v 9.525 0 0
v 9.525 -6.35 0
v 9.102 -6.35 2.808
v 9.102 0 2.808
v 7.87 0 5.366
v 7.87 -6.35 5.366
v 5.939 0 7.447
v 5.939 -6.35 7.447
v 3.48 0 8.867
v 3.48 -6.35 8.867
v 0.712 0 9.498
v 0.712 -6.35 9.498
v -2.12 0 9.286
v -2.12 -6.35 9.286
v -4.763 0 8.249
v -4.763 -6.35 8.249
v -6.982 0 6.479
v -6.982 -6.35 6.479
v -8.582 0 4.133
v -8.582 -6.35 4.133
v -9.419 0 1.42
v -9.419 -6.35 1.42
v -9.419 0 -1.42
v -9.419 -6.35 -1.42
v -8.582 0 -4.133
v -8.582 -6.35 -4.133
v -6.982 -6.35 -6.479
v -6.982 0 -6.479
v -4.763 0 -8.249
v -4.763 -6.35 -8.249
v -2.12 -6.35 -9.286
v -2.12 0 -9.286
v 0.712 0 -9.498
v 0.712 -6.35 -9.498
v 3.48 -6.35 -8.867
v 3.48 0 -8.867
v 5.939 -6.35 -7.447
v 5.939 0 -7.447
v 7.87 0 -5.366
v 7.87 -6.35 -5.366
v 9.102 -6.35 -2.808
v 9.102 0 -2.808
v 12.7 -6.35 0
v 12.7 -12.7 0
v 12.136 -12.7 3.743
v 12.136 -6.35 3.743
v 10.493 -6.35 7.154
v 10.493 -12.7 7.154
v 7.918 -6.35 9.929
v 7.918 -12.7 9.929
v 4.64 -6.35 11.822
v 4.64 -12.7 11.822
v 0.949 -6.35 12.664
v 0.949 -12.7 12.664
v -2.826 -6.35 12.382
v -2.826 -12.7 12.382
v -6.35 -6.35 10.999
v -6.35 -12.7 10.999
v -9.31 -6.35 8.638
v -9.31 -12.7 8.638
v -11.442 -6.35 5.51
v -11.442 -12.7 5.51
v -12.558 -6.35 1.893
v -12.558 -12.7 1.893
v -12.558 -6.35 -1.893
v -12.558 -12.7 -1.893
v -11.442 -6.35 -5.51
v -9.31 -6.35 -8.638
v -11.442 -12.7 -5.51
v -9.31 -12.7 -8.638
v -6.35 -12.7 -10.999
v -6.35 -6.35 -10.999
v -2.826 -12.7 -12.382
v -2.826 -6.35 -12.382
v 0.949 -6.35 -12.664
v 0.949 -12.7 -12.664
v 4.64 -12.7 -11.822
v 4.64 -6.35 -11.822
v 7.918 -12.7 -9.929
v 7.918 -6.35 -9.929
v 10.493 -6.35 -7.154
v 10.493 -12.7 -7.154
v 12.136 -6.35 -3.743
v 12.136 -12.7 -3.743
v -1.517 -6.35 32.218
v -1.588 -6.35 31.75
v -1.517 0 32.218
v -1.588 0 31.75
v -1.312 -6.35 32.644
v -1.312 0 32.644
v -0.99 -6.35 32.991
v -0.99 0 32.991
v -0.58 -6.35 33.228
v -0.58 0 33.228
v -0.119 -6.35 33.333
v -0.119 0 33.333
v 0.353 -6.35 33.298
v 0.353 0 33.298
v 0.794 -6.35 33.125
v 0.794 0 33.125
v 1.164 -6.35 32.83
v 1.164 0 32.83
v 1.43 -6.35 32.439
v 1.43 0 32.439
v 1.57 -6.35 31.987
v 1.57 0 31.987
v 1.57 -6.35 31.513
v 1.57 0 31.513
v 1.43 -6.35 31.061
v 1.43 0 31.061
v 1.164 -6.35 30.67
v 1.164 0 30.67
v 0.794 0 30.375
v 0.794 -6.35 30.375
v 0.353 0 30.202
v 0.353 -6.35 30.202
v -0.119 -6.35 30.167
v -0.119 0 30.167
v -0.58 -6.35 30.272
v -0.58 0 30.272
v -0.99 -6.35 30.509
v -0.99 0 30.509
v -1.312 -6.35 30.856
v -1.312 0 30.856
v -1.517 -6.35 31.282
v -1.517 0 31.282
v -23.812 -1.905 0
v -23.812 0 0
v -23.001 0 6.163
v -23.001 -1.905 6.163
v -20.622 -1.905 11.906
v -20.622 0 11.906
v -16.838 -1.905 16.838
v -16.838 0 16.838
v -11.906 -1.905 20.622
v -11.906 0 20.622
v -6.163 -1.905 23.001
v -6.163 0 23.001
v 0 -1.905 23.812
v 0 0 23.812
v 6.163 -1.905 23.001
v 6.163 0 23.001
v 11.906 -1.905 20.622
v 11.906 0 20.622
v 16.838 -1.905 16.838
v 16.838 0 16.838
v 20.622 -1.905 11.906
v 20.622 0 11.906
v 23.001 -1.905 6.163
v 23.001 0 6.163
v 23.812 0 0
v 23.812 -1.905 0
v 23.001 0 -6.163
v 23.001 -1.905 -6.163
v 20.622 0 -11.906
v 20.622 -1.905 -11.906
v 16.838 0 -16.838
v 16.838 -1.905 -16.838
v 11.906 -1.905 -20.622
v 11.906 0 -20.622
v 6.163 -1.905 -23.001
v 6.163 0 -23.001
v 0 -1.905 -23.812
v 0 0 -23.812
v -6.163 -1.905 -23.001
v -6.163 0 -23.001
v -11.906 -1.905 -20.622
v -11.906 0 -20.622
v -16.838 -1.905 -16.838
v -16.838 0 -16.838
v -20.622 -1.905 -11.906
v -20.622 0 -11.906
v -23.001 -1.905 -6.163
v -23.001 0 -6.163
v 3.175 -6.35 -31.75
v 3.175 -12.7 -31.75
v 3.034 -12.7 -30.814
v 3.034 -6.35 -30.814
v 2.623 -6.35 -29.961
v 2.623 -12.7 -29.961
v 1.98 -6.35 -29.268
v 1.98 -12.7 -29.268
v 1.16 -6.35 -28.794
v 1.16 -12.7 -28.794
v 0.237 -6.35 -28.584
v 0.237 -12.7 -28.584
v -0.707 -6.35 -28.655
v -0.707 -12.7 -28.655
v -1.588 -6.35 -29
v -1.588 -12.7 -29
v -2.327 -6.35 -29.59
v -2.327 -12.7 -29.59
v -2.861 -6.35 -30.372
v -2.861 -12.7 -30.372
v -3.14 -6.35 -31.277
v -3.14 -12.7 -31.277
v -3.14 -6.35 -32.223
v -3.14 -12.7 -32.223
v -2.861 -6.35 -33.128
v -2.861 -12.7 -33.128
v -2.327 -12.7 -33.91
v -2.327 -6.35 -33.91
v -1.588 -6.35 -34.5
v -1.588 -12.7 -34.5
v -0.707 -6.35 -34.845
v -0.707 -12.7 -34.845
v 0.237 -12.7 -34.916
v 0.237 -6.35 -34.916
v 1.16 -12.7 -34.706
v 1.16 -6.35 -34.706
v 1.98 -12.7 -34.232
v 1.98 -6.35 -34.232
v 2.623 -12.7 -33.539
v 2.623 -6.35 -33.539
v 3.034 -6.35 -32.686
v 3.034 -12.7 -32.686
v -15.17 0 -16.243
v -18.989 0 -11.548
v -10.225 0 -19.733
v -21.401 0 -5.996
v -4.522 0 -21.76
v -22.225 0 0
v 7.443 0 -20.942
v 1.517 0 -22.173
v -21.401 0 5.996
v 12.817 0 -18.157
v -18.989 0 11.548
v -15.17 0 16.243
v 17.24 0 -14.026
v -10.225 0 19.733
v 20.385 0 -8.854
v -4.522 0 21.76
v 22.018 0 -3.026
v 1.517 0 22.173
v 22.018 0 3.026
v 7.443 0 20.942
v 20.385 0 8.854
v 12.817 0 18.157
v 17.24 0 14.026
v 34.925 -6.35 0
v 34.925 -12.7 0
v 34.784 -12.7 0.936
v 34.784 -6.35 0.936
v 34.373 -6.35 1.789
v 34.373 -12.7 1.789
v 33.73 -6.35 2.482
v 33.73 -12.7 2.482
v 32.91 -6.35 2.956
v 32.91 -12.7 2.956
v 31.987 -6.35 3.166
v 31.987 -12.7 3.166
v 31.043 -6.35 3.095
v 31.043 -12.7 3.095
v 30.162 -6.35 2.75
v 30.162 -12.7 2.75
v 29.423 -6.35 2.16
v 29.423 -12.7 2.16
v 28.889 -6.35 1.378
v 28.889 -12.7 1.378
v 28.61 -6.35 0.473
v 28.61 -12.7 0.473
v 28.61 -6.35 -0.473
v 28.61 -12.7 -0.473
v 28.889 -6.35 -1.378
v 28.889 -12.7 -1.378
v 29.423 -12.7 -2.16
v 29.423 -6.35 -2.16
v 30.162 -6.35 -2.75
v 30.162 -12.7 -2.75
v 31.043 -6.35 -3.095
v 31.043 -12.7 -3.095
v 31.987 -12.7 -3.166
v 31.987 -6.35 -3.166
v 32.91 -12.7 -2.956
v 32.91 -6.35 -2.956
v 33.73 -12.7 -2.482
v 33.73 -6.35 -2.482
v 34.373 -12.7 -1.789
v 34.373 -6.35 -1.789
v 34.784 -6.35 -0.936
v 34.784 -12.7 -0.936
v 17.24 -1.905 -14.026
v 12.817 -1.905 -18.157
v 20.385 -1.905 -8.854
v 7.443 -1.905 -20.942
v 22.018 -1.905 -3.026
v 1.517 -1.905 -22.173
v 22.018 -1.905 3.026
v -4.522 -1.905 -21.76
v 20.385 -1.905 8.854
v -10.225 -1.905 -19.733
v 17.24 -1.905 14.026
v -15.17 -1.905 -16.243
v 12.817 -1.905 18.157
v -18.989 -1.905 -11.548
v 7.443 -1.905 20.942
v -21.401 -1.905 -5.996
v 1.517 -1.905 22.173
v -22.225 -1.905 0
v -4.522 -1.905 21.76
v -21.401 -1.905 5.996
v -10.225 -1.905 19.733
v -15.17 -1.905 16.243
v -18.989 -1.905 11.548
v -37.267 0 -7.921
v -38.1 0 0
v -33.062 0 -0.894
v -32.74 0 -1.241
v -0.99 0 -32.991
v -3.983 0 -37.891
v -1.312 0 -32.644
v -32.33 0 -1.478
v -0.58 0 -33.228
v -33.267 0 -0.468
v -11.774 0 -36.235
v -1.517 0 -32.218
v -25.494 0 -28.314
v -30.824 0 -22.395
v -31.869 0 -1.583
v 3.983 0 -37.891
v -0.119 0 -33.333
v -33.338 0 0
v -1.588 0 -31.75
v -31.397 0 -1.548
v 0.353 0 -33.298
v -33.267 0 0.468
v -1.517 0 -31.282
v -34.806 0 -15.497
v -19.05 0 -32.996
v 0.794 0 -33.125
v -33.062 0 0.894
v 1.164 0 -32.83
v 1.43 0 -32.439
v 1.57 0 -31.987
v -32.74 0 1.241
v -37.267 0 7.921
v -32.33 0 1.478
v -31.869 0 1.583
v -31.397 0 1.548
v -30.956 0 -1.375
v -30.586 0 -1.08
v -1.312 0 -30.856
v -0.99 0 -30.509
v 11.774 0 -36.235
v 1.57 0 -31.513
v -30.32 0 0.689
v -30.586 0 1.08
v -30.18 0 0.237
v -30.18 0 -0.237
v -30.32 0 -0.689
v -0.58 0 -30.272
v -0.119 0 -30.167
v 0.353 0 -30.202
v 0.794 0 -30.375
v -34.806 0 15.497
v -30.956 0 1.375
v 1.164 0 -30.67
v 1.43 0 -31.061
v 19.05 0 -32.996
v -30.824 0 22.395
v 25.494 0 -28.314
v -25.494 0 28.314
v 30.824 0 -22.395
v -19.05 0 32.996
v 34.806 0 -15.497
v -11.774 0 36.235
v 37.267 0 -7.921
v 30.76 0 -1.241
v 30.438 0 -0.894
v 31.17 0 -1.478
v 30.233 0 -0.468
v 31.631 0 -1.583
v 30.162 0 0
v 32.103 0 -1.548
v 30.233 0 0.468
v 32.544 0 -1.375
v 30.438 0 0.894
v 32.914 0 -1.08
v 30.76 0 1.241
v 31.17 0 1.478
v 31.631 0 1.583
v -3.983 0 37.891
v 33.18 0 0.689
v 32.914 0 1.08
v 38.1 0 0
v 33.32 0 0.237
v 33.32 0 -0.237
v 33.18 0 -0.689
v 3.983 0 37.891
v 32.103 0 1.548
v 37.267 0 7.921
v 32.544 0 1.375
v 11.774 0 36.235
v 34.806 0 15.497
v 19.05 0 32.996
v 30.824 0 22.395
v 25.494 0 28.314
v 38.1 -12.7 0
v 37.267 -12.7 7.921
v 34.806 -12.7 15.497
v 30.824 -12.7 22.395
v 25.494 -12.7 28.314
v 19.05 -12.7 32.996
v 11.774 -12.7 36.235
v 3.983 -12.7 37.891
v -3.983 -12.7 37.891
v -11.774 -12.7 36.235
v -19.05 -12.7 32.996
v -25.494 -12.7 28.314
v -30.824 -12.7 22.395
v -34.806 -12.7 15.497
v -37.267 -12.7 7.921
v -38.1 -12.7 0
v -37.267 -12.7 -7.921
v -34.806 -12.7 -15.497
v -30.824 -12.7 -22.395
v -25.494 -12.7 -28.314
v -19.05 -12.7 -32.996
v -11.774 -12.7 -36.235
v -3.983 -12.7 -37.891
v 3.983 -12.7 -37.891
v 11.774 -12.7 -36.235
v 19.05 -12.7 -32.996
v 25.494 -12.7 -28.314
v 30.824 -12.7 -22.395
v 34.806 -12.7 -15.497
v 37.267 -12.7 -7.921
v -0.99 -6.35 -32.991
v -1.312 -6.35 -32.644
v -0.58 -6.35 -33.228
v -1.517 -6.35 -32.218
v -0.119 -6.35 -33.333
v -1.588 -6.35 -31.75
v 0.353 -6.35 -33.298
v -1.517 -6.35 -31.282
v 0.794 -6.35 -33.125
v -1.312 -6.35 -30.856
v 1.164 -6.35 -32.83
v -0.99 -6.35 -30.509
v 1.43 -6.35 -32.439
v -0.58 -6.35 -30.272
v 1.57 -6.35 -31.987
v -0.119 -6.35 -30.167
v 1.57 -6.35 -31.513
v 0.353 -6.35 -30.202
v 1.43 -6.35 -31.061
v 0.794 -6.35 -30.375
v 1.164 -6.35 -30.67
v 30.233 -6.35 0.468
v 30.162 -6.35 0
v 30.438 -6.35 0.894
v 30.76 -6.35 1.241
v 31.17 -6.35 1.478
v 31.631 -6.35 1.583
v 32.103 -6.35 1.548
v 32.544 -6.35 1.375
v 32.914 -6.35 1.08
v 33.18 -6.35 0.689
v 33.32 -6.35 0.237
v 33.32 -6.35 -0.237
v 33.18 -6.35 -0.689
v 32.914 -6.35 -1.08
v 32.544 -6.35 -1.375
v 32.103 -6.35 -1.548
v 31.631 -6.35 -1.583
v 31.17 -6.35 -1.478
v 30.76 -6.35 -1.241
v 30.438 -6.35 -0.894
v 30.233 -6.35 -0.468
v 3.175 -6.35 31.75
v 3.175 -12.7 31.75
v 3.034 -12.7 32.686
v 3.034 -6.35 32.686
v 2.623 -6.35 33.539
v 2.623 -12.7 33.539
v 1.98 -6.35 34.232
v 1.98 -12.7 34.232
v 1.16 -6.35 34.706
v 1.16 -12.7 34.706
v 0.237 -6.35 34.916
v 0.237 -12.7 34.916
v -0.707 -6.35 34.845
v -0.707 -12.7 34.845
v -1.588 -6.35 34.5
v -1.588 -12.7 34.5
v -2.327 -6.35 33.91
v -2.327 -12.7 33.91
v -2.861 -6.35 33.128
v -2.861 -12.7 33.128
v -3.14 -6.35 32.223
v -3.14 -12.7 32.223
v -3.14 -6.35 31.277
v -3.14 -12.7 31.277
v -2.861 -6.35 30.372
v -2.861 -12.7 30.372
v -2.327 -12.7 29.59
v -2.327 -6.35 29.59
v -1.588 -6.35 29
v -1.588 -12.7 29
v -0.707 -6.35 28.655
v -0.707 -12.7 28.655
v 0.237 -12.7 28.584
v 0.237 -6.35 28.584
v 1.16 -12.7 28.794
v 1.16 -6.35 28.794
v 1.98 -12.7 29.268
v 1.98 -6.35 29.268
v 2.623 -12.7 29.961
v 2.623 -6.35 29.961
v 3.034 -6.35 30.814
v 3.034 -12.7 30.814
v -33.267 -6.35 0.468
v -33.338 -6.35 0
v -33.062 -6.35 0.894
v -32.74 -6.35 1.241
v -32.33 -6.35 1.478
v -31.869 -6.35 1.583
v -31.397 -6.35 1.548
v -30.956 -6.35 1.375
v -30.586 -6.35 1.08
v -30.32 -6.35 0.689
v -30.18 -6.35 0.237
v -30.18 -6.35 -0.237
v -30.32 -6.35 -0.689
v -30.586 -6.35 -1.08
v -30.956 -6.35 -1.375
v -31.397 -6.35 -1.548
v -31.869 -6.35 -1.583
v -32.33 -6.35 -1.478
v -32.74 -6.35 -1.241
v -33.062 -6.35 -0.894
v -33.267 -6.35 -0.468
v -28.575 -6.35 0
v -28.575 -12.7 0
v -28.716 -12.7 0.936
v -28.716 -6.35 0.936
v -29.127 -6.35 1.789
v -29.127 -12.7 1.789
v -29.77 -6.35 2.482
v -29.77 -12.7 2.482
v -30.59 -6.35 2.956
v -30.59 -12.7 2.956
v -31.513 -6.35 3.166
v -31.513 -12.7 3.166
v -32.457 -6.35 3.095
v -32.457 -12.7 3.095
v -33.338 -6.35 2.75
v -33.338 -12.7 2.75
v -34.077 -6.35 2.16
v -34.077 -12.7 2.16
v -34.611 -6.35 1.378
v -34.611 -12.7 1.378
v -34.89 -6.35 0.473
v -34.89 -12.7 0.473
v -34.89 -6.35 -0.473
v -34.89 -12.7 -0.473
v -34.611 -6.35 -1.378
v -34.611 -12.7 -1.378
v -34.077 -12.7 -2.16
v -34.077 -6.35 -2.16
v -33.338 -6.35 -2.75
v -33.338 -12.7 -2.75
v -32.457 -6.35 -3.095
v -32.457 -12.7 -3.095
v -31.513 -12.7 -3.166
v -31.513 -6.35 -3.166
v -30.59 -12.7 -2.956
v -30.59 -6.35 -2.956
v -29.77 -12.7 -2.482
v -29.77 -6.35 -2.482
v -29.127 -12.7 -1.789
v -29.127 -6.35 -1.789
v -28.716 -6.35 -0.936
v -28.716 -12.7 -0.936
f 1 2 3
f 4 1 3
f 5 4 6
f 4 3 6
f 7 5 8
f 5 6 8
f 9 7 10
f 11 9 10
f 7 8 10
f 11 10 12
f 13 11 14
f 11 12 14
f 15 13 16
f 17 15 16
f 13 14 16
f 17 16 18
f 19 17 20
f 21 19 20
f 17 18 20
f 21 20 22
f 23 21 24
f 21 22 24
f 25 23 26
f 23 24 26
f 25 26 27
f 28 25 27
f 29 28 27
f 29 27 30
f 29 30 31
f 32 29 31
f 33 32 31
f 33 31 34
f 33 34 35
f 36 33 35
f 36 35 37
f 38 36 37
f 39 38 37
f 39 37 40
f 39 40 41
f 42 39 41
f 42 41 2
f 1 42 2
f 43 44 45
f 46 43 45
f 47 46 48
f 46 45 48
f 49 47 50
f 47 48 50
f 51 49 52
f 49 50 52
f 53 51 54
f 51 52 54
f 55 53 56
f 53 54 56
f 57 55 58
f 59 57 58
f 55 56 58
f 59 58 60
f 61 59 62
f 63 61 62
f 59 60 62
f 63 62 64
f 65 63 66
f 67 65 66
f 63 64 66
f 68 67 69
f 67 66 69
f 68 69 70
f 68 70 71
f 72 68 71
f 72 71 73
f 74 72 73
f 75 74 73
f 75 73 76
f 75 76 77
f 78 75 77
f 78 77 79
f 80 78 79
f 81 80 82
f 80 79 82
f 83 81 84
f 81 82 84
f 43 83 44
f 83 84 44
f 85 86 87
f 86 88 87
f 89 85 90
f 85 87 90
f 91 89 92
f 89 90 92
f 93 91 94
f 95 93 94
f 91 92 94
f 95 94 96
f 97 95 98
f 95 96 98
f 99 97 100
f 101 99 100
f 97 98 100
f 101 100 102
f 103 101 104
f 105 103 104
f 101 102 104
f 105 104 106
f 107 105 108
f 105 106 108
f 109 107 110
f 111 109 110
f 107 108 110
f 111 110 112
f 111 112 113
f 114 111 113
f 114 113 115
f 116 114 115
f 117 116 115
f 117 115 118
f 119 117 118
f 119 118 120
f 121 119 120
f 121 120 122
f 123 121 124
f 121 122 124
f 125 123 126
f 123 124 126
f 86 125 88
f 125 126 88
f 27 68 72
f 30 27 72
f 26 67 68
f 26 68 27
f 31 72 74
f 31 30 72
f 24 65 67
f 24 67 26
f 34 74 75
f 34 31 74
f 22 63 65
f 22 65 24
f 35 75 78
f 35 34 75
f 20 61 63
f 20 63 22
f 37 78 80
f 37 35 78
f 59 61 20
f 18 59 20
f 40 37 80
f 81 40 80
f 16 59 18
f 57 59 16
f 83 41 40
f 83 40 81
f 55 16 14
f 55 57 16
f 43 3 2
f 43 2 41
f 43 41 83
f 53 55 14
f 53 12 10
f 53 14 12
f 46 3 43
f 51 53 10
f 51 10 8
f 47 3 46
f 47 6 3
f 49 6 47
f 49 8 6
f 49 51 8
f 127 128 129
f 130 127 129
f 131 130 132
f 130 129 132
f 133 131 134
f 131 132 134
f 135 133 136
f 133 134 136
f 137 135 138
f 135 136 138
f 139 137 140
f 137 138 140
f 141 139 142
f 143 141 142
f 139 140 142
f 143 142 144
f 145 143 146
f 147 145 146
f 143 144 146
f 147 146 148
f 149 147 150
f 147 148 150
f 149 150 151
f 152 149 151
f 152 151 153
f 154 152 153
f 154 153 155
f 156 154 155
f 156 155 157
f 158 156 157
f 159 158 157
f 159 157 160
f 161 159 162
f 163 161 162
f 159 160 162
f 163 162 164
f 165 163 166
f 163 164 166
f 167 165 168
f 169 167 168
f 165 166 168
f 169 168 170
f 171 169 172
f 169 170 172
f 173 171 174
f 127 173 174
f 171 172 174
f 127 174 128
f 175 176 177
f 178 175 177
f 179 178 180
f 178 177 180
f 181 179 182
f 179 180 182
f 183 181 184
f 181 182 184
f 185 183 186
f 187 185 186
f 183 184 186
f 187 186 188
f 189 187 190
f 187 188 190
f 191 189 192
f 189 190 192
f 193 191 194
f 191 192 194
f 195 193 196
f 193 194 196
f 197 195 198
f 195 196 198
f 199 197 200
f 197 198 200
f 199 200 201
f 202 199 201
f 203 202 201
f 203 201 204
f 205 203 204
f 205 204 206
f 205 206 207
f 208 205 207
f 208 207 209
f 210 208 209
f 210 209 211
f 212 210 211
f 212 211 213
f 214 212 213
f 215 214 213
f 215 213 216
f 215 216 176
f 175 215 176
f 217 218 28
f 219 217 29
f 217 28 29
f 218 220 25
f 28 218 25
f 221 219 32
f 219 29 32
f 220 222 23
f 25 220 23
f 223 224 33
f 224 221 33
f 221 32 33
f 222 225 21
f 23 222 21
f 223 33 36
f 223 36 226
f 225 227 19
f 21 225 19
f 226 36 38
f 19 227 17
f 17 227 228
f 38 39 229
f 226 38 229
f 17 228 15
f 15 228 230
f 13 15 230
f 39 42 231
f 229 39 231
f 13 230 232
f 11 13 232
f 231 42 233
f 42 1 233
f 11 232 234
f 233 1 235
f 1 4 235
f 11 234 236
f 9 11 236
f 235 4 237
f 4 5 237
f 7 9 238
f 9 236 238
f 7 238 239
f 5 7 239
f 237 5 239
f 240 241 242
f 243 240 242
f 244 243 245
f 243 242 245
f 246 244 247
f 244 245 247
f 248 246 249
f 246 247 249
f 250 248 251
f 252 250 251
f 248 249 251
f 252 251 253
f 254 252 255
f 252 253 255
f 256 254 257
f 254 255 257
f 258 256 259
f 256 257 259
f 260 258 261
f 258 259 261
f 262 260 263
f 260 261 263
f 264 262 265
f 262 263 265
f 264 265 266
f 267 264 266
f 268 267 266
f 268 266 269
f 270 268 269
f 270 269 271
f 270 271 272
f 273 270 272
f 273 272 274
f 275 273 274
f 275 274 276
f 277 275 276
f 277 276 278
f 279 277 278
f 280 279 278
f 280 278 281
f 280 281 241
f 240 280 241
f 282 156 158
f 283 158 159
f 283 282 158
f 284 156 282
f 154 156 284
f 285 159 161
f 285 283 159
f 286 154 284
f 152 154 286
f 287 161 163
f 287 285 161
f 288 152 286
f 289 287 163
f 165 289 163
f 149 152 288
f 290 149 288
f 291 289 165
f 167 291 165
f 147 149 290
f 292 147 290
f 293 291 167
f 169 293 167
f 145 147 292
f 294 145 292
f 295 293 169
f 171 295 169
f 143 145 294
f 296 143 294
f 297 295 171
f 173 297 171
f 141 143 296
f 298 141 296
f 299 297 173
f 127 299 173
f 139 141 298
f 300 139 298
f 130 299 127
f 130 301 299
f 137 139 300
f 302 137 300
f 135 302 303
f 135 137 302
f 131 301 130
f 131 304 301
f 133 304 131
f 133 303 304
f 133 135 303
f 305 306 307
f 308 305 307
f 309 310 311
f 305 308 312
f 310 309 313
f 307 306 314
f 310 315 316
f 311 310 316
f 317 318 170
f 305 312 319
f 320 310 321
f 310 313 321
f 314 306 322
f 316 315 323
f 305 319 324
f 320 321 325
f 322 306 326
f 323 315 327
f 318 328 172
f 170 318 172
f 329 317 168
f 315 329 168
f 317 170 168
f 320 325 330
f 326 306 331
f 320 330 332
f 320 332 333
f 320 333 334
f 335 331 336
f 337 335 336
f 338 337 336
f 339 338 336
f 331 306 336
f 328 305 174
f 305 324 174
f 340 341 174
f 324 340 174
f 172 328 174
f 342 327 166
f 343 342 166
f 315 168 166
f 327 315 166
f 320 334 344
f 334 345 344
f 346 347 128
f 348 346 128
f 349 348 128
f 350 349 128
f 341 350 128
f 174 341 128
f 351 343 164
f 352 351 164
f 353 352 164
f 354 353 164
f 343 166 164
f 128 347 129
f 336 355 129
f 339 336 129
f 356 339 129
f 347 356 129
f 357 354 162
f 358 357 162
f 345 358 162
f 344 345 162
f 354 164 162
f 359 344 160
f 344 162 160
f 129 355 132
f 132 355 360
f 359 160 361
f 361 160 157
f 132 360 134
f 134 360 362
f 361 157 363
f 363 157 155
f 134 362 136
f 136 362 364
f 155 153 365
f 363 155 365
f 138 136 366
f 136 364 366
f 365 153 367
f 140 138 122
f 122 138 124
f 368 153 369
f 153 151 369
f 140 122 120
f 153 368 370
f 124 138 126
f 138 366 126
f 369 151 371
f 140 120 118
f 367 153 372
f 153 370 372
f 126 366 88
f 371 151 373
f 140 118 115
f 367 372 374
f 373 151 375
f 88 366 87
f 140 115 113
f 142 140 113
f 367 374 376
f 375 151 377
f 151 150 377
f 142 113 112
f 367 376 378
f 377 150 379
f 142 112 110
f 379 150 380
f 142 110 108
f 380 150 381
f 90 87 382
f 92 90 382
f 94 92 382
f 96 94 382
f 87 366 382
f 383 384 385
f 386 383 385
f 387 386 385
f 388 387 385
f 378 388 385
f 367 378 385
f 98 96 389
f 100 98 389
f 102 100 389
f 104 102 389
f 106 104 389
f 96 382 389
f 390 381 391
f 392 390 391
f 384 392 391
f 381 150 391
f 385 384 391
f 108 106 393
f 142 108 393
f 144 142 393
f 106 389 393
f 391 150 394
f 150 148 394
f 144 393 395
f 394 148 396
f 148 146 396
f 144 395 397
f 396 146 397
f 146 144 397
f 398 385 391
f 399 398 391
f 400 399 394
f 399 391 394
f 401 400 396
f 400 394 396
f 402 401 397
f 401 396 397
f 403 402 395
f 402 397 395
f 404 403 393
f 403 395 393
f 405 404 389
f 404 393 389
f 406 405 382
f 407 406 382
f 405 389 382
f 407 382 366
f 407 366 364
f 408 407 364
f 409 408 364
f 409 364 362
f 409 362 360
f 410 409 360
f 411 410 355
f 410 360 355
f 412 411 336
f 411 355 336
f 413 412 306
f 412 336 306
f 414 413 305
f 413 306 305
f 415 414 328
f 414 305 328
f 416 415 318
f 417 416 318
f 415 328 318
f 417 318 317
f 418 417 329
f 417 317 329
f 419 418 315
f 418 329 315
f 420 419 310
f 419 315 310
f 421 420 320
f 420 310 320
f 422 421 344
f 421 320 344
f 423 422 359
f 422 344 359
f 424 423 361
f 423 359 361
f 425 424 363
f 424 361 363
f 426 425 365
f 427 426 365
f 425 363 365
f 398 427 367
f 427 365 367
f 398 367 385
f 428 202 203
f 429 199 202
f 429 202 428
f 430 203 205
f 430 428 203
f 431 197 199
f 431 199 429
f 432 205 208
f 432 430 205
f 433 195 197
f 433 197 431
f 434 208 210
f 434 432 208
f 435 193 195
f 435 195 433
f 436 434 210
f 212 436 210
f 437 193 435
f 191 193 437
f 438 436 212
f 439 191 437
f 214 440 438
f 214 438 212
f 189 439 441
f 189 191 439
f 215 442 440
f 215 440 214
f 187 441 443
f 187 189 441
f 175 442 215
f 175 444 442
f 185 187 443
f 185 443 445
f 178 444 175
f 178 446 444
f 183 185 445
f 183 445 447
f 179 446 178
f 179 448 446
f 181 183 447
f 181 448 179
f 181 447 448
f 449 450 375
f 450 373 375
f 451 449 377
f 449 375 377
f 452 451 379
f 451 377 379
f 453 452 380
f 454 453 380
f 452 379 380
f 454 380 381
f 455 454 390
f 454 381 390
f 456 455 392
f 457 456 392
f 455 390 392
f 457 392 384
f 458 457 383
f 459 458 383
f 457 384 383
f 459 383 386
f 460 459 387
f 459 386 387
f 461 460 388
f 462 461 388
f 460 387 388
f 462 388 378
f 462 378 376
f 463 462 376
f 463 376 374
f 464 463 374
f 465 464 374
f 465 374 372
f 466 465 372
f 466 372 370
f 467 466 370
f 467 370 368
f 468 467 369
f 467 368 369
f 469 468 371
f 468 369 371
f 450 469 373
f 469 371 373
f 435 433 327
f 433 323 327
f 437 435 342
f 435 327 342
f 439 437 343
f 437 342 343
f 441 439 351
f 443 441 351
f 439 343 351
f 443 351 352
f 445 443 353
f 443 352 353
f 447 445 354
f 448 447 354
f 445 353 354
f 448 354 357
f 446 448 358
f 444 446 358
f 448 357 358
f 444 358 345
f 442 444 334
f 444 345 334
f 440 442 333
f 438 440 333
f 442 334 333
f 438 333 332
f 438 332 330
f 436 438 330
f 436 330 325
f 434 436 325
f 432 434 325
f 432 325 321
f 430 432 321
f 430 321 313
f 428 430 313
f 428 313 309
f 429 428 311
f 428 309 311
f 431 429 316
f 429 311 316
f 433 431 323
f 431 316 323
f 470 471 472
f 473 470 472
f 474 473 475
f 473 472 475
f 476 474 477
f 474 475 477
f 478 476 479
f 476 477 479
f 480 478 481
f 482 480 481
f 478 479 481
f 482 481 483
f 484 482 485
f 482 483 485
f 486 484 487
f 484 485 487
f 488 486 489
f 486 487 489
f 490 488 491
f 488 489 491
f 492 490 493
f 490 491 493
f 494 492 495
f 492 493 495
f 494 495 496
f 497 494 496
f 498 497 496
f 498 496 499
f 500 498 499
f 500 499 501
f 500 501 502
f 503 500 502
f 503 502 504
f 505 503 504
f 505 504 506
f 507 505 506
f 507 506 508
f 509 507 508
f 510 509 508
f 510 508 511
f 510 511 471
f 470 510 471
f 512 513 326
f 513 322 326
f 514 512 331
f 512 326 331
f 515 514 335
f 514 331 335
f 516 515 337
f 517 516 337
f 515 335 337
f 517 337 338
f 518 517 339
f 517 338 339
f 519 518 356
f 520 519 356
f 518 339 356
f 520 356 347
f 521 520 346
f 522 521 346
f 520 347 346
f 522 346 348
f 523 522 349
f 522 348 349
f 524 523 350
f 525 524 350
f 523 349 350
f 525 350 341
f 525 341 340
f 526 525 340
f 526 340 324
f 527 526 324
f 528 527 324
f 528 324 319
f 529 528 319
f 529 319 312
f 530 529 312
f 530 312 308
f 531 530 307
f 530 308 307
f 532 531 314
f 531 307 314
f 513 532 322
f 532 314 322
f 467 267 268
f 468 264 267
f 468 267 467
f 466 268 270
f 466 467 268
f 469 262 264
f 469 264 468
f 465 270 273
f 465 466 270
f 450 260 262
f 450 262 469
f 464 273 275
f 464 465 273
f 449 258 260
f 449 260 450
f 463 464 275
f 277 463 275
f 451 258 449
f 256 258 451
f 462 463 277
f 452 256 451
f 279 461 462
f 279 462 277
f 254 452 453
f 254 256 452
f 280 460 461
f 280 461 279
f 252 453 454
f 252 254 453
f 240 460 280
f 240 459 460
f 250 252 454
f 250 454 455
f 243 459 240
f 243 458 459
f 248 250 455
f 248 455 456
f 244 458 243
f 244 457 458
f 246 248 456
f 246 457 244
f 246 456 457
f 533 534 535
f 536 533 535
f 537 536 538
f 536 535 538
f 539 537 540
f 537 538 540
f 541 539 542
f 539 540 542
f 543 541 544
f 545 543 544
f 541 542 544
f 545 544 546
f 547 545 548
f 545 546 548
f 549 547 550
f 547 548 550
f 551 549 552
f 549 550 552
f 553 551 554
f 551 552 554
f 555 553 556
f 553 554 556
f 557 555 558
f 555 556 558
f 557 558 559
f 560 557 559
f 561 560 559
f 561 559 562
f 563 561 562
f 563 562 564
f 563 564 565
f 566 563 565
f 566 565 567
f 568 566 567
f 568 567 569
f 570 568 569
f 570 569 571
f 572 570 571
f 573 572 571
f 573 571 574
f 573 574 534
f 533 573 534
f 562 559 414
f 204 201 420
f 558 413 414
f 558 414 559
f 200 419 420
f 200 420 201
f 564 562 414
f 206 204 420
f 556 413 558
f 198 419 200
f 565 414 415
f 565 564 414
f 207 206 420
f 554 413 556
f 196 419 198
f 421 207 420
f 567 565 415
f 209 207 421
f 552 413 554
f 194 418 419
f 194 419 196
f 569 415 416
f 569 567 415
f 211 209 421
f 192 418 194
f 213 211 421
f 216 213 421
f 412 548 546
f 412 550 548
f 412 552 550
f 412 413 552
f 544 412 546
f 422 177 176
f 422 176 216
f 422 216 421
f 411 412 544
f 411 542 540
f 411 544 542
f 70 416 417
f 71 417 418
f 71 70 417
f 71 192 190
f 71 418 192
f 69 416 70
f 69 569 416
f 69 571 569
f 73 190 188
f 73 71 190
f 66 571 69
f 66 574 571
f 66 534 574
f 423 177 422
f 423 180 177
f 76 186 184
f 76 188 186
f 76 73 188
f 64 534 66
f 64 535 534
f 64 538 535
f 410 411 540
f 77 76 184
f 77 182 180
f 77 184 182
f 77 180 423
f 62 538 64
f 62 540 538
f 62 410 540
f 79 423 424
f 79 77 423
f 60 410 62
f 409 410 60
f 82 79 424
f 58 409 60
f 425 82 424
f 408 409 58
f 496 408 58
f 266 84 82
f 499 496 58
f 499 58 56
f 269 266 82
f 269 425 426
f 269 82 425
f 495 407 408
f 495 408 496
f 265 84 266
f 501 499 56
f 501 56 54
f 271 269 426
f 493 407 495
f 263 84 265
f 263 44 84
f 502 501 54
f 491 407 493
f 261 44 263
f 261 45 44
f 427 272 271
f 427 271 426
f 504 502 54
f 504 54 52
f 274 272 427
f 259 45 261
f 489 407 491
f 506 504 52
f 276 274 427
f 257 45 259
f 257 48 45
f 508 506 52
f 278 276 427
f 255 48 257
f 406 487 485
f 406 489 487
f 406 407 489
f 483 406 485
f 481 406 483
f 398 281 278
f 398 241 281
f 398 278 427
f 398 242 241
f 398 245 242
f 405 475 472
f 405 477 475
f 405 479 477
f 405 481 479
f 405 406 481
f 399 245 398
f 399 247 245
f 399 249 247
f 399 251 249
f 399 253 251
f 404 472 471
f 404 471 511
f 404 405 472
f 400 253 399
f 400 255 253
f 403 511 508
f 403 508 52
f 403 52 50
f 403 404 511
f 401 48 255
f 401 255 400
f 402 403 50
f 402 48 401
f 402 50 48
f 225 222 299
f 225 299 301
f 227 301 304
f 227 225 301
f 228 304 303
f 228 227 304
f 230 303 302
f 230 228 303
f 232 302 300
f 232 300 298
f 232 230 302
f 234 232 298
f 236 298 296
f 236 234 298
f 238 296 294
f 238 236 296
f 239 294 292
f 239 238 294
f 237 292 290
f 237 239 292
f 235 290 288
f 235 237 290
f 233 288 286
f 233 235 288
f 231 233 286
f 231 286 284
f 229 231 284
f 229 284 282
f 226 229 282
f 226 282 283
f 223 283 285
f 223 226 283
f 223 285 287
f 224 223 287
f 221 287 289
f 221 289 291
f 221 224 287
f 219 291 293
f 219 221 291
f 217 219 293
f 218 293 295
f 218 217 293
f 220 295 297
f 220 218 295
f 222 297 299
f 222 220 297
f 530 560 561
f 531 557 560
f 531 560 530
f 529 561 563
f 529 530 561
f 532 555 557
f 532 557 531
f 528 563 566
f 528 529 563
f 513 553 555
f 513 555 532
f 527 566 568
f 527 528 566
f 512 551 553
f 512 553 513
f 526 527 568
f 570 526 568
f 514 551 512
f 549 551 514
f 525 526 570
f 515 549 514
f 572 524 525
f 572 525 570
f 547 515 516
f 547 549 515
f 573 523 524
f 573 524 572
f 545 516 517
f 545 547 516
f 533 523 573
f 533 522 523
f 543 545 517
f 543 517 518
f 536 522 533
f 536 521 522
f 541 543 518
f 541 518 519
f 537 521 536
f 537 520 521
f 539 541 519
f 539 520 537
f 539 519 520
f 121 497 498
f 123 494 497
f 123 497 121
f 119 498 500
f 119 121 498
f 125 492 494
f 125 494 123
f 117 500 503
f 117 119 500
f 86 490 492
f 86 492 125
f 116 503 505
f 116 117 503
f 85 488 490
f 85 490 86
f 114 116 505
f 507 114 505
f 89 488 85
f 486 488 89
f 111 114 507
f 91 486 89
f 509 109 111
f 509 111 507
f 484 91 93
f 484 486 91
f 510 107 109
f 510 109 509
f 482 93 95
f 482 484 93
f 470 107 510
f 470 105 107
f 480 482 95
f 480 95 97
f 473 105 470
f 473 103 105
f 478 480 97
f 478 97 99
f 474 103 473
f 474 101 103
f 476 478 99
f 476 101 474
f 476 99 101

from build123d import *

# Parameters (mm, degrees)
F0_R           = 38.1
F0_R_2         = 0.8751159205
F1_DEPTH       = 12.7
F2_R           = 9.525
F3_DEPTH       = 12.701
F4_R           = 12.7
F5_DEPTH       = 6.35
F7_D           = 3.175
F7_CBORE_D     = 6.35
F7_CBORE_DEPTH = 6.35
F8_R           = 23.8125
F8_R_2         = 22.225
F9_DEPTH       = 1.905


with BuildPart() as f1:
    # F0 (on Front) → F1 (new body)
    with BuildSketch(Plane.XZ):
        Circle(F0_R)
        with Locations((20.7111840319, 10.8808754866)):
            Circle(F0_R_2, mode=Mode.SUBTRACT)
        with Locations((20.7111840319, 10.8808754866)):
            Circle(F0_R_2)
    extrude(amount=F1_DEPTH)

    # F2 (on face) → F3 (cut, through all)
    with BuildSketch(Plane.XZ.offset(12.7)):
        Circle(F2_R)
    extrude(amount=-F3_DEPTH, mode=Mode.SUBTRACT)

    # F4 (on face) → F5 (cut)
    with BuildSketch(Plane.XZ.offset(12.7)):
        Circle(F4_R)
    extrude(amount=-F5_DEPTH, mode=Mode.SUBTRACT)

    # F7 (through all)
    with Locations(Plane.XZ.offset(12.7)):
        with Locations((0, 31.75), (31.75, 0), (0, -31.75), (-31.75, 0)):
            CounterBoreHole(F7_D / 2, F7_CBORE_D / 2, F7_CBORE_DEPTH)

    # F8 (on face) → F9 (cut)
    with BuildSketch(Plane(origin=(0, 0, 0), x_dir=(-1, 0, 0), z_dir=(0, 1, 0))):
        Circle(F8_R)
        Circle(F8_R_2, mode=Mode.SUBTRACT)
    extrude(amount=-F9_DEPTH, mode=Mode.SUBTRACT)


solid = f1.part
